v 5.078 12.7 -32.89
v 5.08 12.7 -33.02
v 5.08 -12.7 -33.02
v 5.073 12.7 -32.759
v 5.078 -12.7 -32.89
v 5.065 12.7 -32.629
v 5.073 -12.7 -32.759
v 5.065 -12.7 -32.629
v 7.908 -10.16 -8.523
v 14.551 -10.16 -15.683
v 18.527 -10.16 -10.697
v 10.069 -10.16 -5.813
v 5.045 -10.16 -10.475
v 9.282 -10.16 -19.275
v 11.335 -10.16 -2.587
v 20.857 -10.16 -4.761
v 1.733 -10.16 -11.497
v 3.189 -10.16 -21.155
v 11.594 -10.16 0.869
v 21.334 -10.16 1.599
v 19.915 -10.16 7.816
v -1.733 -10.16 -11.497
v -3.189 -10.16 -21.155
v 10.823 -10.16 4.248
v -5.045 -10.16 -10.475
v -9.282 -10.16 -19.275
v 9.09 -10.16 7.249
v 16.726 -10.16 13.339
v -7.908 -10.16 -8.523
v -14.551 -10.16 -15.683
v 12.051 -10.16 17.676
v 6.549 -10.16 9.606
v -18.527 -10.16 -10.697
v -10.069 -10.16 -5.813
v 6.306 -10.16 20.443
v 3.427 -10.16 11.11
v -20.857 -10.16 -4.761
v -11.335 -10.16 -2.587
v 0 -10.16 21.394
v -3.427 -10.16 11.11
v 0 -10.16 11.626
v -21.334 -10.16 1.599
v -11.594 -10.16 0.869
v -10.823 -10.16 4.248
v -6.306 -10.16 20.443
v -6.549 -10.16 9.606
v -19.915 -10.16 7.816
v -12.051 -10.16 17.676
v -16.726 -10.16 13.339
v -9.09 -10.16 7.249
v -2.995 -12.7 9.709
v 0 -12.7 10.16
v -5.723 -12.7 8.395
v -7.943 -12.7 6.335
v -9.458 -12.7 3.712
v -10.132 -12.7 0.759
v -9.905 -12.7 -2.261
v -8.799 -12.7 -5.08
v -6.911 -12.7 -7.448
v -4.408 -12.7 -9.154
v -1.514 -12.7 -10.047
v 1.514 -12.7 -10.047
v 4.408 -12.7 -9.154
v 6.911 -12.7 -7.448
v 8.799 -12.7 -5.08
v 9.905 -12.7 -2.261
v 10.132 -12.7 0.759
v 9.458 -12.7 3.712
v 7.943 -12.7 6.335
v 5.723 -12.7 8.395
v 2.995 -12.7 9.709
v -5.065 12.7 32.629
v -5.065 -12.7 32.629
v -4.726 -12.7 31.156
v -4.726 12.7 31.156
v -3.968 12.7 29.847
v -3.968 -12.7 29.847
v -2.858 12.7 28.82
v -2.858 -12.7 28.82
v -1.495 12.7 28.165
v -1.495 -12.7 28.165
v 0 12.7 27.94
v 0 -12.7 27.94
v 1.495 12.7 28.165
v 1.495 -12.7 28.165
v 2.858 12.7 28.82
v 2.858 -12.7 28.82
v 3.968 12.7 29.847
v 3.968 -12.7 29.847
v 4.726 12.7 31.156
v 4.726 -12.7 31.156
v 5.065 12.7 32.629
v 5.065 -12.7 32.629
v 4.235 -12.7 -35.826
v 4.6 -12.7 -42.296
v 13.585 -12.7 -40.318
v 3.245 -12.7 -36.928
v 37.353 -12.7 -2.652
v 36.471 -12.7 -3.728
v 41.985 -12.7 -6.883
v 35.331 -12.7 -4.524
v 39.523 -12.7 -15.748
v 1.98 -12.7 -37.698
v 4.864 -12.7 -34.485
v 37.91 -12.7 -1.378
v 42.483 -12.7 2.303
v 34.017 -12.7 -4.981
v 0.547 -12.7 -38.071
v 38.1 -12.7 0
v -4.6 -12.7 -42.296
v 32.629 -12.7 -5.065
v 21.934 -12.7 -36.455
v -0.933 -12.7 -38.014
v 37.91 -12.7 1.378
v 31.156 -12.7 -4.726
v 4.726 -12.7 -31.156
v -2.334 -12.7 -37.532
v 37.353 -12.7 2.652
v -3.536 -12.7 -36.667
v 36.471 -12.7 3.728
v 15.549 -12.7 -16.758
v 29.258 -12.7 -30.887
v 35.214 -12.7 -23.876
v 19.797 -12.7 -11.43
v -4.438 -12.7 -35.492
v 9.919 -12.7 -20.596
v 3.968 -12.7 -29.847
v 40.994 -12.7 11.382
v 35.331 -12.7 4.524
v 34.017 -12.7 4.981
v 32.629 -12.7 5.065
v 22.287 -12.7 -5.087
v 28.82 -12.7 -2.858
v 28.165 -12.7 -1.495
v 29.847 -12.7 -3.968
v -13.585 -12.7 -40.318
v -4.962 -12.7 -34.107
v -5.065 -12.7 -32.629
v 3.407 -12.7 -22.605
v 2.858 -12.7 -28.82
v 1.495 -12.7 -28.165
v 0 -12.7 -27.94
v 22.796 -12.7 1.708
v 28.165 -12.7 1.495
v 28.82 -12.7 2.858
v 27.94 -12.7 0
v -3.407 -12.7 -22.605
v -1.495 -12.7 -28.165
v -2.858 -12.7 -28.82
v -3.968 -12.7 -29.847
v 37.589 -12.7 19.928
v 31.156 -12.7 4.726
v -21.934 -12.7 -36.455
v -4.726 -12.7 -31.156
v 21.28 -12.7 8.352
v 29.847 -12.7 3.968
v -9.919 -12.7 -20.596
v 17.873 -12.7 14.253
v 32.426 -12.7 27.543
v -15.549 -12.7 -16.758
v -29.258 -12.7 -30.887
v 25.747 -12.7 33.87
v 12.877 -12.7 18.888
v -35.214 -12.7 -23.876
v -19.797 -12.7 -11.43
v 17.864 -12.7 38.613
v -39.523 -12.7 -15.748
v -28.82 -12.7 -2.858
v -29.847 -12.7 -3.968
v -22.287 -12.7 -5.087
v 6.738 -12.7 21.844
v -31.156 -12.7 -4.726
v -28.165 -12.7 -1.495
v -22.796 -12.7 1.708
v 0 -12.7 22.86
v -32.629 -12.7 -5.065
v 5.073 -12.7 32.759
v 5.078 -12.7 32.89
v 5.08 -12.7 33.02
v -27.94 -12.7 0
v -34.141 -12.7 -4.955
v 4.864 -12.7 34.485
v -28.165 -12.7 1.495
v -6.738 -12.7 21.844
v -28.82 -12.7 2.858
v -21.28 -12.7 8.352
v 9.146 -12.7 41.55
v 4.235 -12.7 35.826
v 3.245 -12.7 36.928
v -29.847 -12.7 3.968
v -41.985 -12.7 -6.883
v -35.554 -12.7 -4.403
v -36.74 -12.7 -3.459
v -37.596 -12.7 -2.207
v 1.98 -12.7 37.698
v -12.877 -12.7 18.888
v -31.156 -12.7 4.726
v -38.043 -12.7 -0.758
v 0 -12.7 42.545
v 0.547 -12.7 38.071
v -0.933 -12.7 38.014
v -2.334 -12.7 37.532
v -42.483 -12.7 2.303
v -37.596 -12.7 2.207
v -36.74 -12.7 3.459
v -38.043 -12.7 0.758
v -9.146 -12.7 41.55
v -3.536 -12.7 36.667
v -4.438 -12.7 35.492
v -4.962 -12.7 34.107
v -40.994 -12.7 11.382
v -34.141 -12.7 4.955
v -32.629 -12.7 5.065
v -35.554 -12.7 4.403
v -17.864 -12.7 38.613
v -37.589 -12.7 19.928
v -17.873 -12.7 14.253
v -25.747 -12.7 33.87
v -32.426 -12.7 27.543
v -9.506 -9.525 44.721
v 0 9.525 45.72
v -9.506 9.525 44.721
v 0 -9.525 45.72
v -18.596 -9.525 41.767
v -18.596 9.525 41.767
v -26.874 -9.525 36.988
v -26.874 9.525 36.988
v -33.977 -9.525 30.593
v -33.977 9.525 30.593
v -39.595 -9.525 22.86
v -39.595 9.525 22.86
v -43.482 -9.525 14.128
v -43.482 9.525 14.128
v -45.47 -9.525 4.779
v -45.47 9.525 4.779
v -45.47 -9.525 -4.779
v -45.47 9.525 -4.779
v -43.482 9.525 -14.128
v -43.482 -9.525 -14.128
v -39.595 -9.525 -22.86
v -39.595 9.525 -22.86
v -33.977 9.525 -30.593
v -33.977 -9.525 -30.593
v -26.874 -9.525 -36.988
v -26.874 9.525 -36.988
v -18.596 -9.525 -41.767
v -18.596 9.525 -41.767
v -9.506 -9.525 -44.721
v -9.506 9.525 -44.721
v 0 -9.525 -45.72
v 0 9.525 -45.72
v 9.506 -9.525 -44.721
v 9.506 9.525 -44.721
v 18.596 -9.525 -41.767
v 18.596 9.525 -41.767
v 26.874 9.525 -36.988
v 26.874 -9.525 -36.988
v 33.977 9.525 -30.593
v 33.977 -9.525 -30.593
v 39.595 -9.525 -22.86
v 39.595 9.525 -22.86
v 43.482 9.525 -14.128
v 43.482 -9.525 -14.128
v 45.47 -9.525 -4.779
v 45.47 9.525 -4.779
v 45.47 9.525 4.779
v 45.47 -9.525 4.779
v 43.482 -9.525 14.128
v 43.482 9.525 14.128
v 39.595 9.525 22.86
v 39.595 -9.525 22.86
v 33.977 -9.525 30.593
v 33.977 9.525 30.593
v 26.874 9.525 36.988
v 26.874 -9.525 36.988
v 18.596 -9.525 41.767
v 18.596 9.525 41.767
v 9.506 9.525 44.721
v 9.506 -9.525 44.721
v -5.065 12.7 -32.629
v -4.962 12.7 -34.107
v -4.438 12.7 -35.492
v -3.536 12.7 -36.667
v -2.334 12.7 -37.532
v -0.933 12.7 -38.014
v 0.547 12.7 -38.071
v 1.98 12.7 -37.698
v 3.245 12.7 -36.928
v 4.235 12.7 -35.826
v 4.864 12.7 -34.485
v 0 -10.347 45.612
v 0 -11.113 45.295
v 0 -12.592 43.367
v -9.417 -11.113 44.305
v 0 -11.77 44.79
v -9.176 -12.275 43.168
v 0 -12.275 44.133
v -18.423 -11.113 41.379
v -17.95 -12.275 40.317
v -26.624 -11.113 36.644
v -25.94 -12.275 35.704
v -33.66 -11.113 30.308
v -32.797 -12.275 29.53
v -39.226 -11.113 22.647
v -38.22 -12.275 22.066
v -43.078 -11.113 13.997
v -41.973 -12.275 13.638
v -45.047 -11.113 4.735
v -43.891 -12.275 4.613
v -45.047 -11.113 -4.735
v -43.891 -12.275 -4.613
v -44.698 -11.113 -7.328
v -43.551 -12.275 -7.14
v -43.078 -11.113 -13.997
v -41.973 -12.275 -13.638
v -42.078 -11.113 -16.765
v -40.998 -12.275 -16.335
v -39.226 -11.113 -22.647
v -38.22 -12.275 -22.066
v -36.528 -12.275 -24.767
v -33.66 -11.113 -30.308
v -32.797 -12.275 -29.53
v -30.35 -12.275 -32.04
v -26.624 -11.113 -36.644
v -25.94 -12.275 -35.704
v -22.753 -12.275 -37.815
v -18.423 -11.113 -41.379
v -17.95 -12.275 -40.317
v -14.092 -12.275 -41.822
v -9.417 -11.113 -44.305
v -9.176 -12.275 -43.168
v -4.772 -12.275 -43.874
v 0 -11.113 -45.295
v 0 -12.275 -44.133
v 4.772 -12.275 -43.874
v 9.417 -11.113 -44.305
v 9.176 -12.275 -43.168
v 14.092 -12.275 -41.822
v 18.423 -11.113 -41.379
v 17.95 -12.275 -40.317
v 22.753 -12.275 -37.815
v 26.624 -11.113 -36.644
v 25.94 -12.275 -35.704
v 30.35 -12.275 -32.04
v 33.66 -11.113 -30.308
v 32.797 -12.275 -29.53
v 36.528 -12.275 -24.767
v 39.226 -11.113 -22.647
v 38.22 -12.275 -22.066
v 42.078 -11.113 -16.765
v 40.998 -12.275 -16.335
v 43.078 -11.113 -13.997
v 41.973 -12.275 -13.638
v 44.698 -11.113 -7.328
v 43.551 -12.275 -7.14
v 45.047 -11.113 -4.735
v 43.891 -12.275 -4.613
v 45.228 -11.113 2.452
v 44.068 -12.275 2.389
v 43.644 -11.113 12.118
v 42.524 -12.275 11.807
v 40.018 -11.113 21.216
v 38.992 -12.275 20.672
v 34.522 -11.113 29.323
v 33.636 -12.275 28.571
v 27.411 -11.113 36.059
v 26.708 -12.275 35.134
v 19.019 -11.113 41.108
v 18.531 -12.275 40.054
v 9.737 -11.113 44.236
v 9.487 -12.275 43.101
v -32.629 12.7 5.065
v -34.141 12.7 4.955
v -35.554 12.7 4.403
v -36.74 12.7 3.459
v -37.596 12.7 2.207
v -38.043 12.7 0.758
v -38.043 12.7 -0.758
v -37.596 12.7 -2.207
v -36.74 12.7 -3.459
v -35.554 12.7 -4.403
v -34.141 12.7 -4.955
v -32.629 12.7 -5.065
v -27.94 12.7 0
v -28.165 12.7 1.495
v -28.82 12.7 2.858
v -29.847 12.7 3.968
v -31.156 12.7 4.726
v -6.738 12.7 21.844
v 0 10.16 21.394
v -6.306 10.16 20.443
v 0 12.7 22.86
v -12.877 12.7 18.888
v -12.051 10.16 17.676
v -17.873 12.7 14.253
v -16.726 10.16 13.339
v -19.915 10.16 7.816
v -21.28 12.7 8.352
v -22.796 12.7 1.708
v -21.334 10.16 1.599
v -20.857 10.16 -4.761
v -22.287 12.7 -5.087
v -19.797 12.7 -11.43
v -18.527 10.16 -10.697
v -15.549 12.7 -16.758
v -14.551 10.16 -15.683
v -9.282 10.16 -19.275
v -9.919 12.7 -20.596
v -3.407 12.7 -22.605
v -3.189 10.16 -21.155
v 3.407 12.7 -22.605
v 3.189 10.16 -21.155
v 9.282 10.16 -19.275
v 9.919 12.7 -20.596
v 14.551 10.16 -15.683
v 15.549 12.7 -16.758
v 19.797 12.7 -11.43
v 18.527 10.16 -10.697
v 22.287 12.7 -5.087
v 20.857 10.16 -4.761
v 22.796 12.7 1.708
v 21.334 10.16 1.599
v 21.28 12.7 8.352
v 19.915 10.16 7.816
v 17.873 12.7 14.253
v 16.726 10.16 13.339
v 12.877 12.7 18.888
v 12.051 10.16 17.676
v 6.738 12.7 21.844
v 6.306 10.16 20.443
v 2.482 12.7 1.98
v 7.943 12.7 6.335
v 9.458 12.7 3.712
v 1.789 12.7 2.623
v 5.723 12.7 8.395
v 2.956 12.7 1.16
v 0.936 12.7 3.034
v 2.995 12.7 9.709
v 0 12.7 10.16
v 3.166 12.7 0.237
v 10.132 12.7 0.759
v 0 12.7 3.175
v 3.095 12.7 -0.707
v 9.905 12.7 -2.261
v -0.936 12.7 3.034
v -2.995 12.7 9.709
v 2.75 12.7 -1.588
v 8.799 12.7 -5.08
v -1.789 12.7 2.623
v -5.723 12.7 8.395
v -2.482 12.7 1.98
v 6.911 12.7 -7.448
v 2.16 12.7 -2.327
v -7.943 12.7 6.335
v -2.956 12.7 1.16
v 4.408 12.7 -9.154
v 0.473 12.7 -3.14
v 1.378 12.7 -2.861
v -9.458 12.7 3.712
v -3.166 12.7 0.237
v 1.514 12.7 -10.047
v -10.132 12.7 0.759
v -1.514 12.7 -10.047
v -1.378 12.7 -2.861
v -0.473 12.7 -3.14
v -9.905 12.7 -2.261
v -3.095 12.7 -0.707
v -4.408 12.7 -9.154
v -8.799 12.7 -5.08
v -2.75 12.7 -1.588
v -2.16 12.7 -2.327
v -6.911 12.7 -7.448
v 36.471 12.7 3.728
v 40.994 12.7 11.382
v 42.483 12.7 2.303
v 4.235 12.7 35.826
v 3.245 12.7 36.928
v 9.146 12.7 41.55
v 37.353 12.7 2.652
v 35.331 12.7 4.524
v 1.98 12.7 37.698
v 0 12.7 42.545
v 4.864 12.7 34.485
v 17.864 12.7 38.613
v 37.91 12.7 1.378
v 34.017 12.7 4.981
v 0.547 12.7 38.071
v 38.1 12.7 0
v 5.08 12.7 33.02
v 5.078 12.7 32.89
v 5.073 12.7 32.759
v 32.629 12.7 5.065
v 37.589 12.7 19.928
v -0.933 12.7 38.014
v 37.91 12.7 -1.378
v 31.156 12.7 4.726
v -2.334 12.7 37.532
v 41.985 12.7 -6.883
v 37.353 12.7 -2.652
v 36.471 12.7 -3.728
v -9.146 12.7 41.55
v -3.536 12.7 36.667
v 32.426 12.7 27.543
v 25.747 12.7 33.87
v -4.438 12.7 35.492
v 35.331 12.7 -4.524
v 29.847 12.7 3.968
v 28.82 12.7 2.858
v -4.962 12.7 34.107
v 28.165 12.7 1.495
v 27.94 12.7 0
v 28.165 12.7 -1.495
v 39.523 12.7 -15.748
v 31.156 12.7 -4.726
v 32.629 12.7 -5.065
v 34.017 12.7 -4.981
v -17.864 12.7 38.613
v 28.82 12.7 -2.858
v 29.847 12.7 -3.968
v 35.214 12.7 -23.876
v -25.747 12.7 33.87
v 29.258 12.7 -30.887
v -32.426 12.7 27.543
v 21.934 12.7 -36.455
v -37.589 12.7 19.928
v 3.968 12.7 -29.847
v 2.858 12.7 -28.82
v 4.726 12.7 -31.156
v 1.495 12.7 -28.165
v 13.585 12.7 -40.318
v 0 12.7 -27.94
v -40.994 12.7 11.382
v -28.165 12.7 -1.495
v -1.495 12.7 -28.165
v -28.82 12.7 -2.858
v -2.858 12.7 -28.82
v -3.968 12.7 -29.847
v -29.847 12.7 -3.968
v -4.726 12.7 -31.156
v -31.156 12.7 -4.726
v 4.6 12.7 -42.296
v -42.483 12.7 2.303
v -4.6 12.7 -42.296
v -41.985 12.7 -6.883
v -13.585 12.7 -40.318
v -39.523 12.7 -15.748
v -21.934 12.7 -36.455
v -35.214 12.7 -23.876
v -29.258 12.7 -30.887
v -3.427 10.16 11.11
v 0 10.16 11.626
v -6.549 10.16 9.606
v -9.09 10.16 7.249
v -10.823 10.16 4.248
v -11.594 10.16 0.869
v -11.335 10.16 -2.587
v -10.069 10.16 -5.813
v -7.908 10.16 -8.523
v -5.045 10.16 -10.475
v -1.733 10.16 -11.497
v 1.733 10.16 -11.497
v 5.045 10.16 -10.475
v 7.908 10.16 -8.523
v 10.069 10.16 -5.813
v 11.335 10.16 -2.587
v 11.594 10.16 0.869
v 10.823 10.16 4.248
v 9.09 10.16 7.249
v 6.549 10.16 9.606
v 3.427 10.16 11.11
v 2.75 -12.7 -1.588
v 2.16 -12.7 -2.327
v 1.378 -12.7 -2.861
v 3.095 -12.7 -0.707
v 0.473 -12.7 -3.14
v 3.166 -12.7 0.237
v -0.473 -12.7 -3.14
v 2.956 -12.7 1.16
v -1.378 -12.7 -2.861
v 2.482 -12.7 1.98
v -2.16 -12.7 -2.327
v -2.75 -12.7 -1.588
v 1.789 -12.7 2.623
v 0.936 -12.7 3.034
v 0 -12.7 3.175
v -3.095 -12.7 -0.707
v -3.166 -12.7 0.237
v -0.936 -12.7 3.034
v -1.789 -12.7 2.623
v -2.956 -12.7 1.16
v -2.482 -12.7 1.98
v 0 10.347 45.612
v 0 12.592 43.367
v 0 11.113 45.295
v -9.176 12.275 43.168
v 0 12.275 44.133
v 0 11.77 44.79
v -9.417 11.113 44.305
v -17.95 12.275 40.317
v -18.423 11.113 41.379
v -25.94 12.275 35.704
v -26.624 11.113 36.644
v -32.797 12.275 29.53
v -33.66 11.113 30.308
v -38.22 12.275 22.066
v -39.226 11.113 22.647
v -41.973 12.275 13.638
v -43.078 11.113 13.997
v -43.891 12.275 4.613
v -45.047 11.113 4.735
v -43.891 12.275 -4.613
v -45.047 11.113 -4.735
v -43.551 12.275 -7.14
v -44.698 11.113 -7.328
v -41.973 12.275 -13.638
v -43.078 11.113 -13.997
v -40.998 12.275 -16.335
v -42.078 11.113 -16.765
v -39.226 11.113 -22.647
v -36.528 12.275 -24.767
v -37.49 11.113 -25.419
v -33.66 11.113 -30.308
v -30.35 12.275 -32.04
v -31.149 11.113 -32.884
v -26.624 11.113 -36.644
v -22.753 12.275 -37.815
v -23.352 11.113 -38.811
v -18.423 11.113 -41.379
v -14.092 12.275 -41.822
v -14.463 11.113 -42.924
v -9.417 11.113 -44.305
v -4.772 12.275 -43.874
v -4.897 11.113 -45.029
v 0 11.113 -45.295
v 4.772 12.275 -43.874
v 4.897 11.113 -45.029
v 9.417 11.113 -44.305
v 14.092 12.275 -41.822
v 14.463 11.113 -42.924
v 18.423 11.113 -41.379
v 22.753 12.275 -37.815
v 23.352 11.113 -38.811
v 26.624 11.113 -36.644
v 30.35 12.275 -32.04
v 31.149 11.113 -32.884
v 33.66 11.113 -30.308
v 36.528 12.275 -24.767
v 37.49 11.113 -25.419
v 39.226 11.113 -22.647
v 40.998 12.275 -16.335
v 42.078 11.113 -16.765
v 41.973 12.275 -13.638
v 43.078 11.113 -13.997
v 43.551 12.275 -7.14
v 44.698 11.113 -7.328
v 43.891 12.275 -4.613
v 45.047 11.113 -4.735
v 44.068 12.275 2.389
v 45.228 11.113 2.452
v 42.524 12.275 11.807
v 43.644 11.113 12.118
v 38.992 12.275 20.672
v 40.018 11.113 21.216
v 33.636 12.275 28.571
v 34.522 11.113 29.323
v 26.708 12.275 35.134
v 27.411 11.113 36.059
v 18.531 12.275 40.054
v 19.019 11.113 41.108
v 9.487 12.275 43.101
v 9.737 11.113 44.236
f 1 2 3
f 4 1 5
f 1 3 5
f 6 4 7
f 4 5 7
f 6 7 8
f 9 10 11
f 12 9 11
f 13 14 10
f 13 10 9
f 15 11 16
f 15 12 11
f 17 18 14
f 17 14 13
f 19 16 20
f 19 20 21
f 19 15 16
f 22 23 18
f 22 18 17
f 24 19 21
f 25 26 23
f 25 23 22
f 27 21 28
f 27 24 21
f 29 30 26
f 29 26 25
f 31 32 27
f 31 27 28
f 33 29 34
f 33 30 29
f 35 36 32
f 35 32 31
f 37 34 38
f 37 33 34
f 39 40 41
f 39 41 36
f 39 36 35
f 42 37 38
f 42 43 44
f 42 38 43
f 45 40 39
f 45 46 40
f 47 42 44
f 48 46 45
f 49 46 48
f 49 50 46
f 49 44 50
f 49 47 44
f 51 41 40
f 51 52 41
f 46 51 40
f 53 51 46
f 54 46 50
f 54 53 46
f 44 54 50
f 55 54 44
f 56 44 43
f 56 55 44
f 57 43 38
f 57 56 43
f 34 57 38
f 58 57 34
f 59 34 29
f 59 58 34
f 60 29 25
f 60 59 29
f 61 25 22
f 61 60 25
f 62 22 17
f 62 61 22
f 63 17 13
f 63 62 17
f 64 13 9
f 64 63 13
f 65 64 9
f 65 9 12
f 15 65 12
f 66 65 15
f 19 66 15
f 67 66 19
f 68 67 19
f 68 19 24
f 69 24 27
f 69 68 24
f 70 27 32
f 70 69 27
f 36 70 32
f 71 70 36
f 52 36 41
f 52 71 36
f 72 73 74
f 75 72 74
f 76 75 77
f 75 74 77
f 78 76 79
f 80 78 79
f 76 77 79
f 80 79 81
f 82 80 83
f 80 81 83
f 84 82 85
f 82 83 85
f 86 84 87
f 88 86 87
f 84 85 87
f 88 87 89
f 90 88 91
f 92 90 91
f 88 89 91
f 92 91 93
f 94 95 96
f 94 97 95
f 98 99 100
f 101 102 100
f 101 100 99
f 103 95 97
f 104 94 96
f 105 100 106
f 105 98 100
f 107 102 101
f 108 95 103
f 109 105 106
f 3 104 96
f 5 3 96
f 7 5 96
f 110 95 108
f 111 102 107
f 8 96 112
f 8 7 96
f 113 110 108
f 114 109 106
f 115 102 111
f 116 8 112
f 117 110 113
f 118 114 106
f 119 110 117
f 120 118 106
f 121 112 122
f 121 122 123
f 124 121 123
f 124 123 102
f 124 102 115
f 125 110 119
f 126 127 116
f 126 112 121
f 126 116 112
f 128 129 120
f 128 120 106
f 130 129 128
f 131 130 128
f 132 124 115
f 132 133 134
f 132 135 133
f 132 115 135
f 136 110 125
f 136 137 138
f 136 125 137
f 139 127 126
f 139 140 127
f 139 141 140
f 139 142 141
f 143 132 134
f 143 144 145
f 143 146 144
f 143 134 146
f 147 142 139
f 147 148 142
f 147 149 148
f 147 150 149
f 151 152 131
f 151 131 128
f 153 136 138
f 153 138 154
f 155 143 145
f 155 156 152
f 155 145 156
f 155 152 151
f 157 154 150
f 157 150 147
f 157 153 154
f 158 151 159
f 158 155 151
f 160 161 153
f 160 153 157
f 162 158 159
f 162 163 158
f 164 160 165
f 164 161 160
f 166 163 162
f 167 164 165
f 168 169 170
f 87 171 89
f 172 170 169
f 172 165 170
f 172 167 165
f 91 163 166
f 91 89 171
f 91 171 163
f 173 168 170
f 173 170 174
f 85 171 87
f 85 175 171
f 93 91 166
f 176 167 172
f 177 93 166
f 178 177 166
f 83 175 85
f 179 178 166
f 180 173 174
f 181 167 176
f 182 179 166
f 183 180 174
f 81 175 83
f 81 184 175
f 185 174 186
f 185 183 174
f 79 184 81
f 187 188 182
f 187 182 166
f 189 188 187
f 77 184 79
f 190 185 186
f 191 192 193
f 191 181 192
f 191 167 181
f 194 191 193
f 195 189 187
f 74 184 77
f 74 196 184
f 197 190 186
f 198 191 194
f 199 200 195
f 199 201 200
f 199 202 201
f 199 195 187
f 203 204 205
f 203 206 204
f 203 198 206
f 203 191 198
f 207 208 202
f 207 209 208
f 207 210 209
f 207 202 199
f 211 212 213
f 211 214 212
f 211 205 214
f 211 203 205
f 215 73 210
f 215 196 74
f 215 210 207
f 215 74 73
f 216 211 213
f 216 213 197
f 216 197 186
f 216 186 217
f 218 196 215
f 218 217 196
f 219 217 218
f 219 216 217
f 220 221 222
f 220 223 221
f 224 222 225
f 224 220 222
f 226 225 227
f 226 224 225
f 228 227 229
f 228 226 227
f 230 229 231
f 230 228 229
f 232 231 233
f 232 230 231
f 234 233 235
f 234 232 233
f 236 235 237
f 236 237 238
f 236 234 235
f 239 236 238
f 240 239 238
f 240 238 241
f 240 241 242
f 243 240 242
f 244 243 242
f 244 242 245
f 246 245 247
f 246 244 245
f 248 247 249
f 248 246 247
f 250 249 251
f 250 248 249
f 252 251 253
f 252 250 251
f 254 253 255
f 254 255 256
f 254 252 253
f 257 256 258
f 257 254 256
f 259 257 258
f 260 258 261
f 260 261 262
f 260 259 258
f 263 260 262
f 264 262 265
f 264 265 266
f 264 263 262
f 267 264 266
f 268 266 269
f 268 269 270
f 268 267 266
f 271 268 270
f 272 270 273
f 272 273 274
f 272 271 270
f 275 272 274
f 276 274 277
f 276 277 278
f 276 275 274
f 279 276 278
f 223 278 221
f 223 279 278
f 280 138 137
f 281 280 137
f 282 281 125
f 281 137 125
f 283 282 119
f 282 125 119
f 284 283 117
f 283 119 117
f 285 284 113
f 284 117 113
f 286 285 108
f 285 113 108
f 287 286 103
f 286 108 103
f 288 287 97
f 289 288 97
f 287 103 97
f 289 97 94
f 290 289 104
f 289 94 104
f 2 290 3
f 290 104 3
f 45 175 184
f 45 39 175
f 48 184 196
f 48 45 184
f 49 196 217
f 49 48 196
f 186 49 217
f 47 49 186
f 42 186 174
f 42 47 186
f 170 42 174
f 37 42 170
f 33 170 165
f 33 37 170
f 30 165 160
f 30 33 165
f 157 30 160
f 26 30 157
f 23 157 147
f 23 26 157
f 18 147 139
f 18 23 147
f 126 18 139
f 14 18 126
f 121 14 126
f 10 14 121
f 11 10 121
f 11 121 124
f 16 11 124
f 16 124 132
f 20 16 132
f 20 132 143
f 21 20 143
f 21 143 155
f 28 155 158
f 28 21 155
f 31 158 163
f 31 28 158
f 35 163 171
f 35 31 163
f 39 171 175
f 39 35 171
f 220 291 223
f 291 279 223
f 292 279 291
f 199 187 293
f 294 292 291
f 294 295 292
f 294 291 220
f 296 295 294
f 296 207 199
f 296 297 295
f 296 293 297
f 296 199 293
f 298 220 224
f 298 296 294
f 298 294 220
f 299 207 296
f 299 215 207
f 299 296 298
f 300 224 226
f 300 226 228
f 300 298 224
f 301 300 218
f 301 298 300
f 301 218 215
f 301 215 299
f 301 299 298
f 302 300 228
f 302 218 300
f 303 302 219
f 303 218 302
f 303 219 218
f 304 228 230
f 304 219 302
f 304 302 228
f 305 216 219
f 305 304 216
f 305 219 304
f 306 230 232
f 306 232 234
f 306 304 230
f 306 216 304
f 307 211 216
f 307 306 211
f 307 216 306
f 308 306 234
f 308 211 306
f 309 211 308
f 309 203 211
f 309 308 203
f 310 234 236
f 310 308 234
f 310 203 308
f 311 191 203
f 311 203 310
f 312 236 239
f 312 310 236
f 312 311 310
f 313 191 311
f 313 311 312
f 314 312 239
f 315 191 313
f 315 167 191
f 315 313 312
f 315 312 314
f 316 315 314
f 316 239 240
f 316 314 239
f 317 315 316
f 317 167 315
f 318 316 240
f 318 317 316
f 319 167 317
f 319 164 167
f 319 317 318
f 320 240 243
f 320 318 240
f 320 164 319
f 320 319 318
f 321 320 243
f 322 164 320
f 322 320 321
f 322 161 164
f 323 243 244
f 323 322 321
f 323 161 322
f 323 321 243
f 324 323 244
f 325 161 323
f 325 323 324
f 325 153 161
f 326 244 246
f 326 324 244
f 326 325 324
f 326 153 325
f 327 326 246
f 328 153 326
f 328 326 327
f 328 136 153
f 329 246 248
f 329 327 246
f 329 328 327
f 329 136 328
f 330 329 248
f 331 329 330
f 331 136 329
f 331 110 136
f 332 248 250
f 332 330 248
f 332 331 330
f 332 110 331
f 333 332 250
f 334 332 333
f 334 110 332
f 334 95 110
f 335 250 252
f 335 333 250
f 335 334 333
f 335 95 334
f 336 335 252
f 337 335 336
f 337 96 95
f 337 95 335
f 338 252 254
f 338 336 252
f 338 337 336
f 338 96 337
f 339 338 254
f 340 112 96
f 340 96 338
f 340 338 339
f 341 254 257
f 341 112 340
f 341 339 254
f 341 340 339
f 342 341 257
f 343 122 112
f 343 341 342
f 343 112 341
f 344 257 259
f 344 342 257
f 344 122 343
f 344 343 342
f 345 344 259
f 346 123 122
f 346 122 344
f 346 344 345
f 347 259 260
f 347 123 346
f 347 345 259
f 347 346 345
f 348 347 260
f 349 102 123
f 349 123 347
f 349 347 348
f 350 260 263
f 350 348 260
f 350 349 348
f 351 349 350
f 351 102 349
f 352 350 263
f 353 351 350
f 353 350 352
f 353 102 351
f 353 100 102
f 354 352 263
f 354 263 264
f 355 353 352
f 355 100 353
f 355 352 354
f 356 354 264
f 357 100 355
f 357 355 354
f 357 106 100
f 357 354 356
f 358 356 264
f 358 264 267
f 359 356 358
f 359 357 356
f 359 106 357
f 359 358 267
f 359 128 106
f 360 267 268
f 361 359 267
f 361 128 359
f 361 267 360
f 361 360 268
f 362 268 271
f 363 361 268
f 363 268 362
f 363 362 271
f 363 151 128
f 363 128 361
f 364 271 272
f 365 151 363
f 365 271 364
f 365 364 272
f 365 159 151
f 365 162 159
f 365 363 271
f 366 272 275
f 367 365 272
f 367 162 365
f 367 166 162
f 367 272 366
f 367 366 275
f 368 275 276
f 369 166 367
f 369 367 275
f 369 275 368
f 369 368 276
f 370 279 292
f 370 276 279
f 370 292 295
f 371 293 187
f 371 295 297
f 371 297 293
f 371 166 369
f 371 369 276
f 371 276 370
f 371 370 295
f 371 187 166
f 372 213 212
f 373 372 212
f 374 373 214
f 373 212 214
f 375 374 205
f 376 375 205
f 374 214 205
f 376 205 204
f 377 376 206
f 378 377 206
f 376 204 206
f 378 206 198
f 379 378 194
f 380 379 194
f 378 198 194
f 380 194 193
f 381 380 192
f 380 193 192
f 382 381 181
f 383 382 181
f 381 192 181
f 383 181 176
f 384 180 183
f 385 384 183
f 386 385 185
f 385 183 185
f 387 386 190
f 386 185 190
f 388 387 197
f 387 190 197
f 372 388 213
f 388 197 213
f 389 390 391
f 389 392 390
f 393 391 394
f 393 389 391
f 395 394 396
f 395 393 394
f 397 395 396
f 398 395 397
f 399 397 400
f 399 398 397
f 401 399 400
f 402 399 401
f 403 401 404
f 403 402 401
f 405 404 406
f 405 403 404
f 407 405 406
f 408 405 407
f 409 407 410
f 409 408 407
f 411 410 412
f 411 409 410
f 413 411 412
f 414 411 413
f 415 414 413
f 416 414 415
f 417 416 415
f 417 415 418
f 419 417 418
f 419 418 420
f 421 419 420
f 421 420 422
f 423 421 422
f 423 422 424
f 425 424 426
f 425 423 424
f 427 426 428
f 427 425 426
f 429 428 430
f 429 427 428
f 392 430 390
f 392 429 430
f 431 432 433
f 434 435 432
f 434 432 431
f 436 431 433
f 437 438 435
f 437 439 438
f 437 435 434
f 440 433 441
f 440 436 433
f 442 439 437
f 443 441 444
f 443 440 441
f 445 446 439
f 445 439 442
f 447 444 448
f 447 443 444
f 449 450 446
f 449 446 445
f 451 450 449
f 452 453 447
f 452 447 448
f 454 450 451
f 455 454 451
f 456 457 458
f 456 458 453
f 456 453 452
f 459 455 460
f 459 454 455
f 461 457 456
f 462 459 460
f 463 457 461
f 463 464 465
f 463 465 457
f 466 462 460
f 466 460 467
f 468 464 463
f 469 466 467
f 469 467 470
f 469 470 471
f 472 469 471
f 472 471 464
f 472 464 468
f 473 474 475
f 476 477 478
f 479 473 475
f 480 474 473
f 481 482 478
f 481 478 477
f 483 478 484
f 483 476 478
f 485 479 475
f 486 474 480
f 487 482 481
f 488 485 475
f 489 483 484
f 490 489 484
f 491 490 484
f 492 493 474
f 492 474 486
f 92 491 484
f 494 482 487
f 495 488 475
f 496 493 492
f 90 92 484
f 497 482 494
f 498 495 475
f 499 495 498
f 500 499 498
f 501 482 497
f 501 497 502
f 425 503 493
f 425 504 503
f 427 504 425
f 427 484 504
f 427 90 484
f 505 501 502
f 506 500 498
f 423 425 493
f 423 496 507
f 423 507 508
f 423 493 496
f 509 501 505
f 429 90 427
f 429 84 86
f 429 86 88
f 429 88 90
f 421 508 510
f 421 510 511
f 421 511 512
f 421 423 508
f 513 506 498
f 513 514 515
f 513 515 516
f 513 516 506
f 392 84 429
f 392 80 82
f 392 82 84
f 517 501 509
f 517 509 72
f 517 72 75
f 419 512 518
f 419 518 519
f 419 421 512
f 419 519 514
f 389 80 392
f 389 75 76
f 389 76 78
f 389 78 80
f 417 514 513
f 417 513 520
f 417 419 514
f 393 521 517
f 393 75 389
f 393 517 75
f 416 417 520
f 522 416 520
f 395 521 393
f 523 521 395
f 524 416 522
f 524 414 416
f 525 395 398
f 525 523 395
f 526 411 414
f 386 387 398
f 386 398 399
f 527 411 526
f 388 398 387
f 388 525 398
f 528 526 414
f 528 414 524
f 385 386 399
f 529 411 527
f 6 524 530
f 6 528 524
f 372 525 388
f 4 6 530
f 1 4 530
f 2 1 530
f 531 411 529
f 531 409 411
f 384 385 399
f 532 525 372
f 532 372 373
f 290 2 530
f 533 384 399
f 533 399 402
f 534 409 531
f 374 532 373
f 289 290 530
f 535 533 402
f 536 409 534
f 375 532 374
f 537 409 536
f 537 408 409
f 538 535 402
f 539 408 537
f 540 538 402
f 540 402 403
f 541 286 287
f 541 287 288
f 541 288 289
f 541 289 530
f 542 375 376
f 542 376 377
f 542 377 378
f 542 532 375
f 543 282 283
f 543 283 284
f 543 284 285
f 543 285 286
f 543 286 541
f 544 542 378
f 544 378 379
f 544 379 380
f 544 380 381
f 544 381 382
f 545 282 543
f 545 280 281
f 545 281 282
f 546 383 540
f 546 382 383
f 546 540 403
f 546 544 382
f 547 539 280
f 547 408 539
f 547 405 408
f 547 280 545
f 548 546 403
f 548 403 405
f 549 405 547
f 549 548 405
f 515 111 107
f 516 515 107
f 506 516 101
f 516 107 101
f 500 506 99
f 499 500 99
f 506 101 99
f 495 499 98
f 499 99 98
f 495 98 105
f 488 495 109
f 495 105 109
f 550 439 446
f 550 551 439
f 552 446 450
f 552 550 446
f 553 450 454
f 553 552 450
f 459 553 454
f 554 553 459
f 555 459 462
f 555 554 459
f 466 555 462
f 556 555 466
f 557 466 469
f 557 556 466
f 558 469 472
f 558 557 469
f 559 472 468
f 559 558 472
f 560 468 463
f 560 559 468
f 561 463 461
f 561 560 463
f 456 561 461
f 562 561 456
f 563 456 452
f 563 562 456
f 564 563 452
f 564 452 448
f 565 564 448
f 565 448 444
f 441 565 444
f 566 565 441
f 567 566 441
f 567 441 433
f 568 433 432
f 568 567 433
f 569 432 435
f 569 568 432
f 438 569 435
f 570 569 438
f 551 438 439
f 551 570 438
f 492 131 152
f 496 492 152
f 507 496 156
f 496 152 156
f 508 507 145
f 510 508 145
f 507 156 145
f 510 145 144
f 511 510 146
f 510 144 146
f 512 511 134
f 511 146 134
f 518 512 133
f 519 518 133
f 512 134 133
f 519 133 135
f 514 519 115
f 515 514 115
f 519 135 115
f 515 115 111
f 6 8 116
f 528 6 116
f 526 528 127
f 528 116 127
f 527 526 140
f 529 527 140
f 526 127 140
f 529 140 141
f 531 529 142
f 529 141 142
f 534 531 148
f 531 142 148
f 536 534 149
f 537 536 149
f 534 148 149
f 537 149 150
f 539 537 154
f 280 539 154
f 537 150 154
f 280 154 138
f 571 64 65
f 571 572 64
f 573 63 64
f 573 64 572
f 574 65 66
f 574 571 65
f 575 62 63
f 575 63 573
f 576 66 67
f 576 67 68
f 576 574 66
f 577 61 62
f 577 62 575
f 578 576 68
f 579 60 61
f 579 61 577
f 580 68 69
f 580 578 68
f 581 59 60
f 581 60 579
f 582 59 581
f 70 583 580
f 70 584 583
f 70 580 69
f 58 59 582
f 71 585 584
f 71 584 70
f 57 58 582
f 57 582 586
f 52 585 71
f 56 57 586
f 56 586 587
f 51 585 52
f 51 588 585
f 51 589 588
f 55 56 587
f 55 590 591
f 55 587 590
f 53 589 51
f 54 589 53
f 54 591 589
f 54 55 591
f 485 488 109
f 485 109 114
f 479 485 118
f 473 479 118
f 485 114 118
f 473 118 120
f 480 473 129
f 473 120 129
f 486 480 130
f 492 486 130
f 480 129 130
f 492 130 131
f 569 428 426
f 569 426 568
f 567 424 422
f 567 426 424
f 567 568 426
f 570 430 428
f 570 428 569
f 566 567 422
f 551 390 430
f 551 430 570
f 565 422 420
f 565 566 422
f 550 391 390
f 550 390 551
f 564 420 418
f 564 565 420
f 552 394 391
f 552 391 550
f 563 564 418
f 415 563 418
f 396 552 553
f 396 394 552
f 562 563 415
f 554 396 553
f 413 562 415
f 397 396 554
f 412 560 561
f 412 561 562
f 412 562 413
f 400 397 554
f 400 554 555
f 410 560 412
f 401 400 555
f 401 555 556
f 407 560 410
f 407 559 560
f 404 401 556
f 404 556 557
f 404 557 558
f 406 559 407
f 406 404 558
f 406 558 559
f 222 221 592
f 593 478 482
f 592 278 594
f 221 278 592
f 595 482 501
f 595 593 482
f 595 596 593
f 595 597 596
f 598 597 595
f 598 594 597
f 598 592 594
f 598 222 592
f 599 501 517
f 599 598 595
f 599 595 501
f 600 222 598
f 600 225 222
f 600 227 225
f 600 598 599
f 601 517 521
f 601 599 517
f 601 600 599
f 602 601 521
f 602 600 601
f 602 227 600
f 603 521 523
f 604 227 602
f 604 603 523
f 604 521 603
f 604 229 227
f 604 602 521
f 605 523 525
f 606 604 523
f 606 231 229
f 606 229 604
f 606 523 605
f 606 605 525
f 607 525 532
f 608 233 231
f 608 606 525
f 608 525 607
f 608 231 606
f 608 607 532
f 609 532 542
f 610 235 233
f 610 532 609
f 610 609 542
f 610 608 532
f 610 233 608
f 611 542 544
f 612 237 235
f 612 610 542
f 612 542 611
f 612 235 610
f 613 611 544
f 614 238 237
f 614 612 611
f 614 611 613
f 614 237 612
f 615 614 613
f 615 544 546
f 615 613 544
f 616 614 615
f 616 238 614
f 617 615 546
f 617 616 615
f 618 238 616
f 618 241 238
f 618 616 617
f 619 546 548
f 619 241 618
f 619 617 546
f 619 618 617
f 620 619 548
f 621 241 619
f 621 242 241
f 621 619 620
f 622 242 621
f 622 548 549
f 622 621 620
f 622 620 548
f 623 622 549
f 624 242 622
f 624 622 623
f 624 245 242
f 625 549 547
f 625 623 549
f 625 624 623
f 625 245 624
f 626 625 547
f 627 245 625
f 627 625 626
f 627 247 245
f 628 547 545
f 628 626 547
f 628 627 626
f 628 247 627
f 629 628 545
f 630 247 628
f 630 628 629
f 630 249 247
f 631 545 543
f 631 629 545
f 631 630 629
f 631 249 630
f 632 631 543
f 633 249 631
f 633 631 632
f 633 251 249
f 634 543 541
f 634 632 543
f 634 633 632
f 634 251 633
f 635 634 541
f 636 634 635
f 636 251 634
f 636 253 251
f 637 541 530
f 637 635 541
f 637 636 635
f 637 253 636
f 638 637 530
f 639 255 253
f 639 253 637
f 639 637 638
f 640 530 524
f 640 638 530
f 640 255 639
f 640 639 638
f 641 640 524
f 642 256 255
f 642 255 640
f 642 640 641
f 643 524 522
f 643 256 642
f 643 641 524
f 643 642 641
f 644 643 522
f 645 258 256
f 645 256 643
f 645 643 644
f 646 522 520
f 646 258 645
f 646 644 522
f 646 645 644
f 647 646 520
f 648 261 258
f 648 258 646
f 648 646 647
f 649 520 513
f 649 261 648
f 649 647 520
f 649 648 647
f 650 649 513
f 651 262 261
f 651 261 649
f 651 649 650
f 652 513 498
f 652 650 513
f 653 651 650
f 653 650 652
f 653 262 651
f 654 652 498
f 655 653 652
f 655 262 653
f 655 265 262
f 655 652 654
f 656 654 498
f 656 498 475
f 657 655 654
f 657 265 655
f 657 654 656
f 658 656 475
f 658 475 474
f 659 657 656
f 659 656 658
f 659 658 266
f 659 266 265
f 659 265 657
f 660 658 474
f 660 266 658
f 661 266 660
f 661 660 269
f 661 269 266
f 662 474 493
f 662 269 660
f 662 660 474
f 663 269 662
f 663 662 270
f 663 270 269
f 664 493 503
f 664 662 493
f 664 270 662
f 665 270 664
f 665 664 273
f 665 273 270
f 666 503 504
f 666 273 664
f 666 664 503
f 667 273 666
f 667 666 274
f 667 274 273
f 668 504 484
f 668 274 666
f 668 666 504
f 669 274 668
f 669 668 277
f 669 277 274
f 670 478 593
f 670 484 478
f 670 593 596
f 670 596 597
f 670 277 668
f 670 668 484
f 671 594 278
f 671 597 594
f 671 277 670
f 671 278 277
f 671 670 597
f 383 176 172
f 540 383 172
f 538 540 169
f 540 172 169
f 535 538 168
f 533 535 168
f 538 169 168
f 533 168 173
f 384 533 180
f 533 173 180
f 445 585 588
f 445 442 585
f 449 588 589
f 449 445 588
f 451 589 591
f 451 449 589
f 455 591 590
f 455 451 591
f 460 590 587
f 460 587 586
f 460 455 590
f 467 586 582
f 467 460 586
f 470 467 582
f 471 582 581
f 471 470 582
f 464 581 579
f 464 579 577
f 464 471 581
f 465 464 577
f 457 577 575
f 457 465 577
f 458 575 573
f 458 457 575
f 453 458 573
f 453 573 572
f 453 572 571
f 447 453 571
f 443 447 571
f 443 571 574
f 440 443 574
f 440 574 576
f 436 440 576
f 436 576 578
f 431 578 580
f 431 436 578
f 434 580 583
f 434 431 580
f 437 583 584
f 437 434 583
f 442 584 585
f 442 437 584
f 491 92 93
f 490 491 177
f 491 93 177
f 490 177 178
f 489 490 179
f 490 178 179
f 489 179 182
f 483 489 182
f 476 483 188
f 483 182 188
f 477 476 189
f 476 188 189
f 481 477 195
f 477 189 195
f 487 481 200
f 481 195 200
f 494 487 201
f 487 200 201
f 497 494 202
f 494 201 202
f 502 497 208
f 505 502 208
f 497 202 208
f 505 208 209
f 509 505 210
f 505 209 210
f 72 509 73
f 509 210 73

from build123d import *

# Parameters (mm, degrees)
F5_DEPTH      = 25.401
F5_DEPTH_BACK = 25.4


with BuildPart() as f1:
    # F0 (on Right) → F1 (revolve)
    with BuildSketch(Plane.YZ):
        with BuildLine():
            Line((-12.7, 3.175), (12.7, 3.175))
            Line((12.7, 3.175), (12.7, 10.16))
            Line((12.7, 10.16), (10.16, 11.6264696837))
            Line((10.16, 11.6264696837), (10.16, 21.3935303163))
            Line((10.16, 21.3935303163), (12.7, 22.86))
            Line((12.7, 22.86), (12.7, 42.545))
            ThreePointArc((12.7, 42.545), (11.7700640303, 44.7900640303), (9.525, 45.72))
            Line((9.525, 45.72), (-9.525, 45.72))
            ThreePointArc((-9.525, 45.72), (-11.7700640303, 44.7900640303), (-12.7, 42.545))
            Line((-12.7, 42.545), (-12.7, 22.86))
            Line((-12.7, 22.86), (-10.16, 21.3935303163))
            Line((-10.16, 21.3935303163), (-10.16, 11.6264696837))
            Line((-10.16, 11.6264696837), (-12.7, 10.16))
            Line((-12.7, 10.16), (-12.7, 3.175))
        make_face()
    revolve(axis=Axis((0, -22.9387803917, 0), (0, -1, 0)))


with BuildPart() as f2_1:
    # F2: copy of F1
    add(f1.part)

    # F4 (on face) → F5 (cut, two sides)
    with BuildSketch(Plane.XZ.offset(12.7)) as f5_sk:
        with BuildLine():
            ThreePointArc((-5.0649481151, 32.6292307692), (0, 27.94), (5.0649481151, 32.6292307692))
            ThreePointArc((5.0649481151, 32.6292307692), (0, 33.02), (-5.0649481151, 32.6292307692))
        make_face()
        with BuildLine():
            ThreePointArc((-5.0649481151, 32.6292307692), (0, 33.02), (5.0649481151, 32.6292307692))
            ThreePointArc((5.0649481151, 32.6292307692), (5.076235634, 32.8244704939), (5.08, 33.02))
            ThreePointArc((5.08, 33.02), (-0.1955295061, 38.096235634), (-5.0649481151, 32.6292307692))
        make_face()
        with BuildLine():
            ThreePointArc((32.6292307692, -5.0649481151), (32.9221627479, -2.54), (33.02, 0))
            ThreePointArc((33.02, 0), (32.9221627479, 2.54), (32.6292307692, 5.0649481151))
            ThreePointArc((32.6292307692, 5.0649481151), (27.94, 0), (32.6292307692, -5.0649481151))
        make_face()
        with BuildLine():
            ThreePointArc((32.6292307692, 5.0649481151), (32.9221627479, 2.54), (33.02, 0))
            ThreePointArc((33.02, 0), (32.9221627479, -2.54), (32.6292307692, -5.0649481151))
            ThreePointArc((32.6292307692, -5.0649481151), (36.4711804001, -3.7277008794), (38.1, 0))
            ThreePointArc((38.1, 0), (36.4711804001, 3.7277008794), (32.6292307692, 5.0649481151))
        make_face()
        with BuildLine():
            ThreePointArc((-5.0649481151, -32.6292307692), (0, -33.02), (5.0649481151, -32.6292307692))
            ThreePointArc((5.0649481151, -32.6292307692), (0, -27.94), (-5.0649481151, -32.6292307692))
        make_face()
        with BuildLine():
            ThreePointArc((5.08, -33.02), (5.076235634, -32.8244704939), (5.0649481151, -32.6292307692))
            ThreePointArc((5.0649481151, -32.6292307692), (0, -33.02), (-5.0649481151, -32.6292307692))
            ThreePointArc((-5.0649481151, -32.6292307692), (-0.1955295061, -38.096235634), (5.08, -33.02))
        make_face()
        with BuildLine():
            ThreePointArc((-27.94, 0), (-29.2922991206, 3.4511804001), (-32.6292307692, 5.0649481151))
            ThreePointArc((-32.6292307692, 5.0649481151), (-33.02, 0), (-32.6292307692, -5.0649481151))
            ThreePointArc((-32.6292307692, -5.0649481151), (-29.2922991206, -3.4511804001), (-27.94, 0))
        make_face()
        with BuildLine():
            ThreePointArc((-32.6292307692, -5.0649481151), (-33.02, 0), (-32.6292307692, 5.0649481151))
            ThreePointArc((-32.6292307692, 5.0649481151), (-38.1, 0), (-32.6292307692, -5.0649481151))
        make_face()
    extrude(amount=-F5_DEPTH, mode=Mode.SUBTRACT)
    extrude(f5_sk.sketch, amount=F5_DEPTH_BACK, mode=Mode.SUBTRACT)


solid = f2_1.part
